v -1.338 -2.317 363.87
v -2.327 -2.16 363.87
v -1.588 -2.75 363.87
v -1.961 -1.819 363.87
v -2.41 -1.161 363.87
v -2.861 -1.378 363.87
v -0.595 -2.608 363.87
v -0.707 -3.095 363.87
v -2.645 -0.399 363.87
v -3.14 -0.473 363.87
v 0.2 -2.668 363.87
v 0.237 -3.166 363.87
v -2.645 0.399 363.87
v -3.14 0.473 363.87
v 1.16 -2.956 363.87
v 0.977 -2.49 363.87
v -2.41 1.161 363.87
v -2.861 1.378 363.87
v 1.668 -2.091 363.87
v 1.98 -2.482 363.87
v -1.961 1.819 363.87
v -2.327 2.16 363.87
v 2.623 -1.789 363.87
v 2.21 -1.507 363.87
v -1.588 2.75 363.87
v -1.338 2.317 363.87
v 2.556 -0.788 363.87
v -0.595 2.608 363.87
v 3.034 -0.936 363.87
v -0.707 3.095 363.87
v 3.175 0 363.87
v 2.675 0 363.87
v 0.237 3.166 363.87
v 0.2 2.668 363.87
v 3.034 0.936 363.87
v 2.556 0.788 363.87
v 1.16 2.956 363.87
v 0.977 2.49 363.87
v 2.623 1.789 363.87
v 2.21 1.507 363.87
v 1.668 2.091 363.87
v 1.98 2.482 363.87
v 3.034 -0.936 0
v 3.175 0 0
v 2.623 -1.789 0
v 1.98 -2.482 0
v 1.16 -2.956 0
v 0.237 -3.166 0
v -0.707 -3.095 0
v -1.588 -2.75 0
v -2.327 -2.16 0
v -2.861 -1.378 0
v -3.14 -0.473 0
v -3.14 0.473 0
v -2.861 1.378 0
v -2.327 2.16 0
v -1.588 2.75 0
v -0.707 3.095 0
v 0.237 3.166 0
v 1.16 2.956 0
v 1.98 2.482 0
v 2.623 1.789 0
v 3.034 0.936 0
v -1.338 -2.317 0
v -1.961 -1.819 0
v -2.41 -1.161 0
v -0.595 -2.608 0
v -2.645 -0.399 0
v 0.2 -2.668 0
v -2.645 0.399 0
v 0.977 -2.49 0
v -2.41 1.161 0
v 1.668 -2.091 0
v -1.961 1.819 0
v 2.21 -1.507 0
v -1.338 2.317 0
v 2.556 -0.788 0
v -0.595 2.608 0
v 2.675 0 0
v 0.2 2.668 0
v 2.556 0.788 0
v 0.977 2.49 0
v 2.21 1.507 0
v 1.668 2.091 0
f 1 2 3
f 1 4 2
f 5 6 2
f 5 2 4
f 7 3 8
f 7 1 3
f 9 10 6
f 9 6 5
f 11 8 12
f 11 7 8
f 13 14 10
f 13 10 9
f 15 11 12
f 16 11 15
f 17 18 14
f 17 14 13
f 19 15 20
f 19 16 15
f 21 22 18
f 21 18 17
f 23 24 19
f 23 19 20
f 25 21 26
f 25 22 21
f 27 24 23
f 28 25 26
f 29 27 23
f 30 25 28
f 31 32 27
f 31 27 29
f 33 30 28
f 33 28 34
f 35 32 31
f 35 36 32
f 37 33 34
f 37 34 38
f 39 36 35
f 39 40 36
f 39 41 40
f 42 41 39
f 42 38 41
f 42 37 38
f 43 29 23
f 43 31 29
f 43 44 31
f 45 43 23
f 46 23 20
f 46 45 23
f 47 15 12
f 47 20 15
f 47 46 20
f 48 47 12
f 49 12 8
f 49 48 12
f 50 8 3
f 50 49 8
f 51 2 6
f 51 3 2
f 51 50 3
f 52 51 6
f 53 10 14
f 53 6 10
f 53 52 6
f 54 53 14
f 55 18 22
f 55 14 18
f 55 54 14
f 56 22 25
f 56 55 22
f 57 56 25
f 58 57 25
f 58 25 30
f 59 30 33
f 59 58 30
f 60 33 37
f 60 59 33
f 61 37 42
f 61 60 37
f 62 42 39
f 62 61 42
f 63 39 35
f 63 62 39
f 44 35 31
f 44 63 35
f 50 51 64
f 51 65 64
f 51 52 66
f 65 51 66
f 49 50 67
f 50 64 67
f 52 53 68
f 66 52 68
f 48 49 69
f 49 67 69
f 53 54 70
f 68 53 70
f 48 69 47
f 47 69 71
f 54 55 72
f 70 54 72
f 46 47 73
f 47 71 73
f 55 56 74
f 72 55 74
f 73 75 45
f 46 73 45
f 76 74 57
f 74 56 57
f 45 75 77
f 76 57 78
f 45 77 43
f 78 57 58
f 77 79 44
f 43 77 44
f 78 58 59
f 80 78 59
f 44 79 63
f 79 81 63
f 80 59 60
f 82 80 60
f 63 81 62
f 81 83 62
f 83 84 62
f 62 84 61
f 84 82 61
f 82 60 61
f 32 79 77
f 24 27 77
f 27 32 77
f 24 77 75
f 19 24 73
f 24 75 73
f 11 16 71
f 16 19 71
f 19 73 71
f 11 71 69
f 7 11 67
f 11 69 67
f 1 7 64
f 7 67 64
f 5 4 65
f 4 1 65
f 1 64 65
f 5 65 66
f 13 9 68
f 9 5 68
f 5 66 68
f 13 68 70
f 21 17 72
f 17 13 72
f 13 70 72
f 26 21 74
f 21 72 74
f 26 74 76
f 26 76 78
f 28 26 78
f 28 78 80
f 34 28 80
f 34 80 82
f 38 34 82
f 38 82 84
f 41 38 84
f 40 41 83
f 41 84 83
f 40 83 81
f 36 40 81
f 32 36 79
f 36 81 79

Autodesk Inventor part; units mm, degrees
ref_plane "YZ Plane" through (0, 0, 0) normal (1, 0, 0) x (0, 1, 0)
ref_plane "XZ Plane" through (0, 0, 0) normal (0, 1, 0) x (-1, 0, 0)
ref_plane "XY Plane" through (0, 0, 0) normal (0, 0, 1) x (1, 0, 0)
sketch "Sketch1" plane through (0, 0, 0) normal (0, 0, 1) x (1, 0, 0)
  circle A0 centre (0, 0) radius 3.175
  circle A1 centre (0, 0) radius 2.675
  dimension "d0" = 6.35
  dimension "d1" = 5.35
extrude "Extrusion1" add sketch "Sketch1" along normal blind 342.525
sketch "Sketch2" plane through (0, 0, 342.525) normal (0, 0, 1) x (1, 0, 0)
  circle A0 centre (0, 0) radius 2.675 projected
  circle A1 centre (0, 0) radius 3.175 projected
extrude "Extrusion2" add sketch "Sketch2" along normal blind 30.87
sketch "Sketch3" plane through (0, 0, 373.395) normal (0, 0, 1) x (1, 0, 0)
  circle A0 centre (0, 0) radius 2.675 projected
  circle A1 centre (0, 0) radius 3.175 projected
extrude "Extrusion3" cut sketch "Sketch3" against normal blind 9.525
properties part number "coverplate pipe"
